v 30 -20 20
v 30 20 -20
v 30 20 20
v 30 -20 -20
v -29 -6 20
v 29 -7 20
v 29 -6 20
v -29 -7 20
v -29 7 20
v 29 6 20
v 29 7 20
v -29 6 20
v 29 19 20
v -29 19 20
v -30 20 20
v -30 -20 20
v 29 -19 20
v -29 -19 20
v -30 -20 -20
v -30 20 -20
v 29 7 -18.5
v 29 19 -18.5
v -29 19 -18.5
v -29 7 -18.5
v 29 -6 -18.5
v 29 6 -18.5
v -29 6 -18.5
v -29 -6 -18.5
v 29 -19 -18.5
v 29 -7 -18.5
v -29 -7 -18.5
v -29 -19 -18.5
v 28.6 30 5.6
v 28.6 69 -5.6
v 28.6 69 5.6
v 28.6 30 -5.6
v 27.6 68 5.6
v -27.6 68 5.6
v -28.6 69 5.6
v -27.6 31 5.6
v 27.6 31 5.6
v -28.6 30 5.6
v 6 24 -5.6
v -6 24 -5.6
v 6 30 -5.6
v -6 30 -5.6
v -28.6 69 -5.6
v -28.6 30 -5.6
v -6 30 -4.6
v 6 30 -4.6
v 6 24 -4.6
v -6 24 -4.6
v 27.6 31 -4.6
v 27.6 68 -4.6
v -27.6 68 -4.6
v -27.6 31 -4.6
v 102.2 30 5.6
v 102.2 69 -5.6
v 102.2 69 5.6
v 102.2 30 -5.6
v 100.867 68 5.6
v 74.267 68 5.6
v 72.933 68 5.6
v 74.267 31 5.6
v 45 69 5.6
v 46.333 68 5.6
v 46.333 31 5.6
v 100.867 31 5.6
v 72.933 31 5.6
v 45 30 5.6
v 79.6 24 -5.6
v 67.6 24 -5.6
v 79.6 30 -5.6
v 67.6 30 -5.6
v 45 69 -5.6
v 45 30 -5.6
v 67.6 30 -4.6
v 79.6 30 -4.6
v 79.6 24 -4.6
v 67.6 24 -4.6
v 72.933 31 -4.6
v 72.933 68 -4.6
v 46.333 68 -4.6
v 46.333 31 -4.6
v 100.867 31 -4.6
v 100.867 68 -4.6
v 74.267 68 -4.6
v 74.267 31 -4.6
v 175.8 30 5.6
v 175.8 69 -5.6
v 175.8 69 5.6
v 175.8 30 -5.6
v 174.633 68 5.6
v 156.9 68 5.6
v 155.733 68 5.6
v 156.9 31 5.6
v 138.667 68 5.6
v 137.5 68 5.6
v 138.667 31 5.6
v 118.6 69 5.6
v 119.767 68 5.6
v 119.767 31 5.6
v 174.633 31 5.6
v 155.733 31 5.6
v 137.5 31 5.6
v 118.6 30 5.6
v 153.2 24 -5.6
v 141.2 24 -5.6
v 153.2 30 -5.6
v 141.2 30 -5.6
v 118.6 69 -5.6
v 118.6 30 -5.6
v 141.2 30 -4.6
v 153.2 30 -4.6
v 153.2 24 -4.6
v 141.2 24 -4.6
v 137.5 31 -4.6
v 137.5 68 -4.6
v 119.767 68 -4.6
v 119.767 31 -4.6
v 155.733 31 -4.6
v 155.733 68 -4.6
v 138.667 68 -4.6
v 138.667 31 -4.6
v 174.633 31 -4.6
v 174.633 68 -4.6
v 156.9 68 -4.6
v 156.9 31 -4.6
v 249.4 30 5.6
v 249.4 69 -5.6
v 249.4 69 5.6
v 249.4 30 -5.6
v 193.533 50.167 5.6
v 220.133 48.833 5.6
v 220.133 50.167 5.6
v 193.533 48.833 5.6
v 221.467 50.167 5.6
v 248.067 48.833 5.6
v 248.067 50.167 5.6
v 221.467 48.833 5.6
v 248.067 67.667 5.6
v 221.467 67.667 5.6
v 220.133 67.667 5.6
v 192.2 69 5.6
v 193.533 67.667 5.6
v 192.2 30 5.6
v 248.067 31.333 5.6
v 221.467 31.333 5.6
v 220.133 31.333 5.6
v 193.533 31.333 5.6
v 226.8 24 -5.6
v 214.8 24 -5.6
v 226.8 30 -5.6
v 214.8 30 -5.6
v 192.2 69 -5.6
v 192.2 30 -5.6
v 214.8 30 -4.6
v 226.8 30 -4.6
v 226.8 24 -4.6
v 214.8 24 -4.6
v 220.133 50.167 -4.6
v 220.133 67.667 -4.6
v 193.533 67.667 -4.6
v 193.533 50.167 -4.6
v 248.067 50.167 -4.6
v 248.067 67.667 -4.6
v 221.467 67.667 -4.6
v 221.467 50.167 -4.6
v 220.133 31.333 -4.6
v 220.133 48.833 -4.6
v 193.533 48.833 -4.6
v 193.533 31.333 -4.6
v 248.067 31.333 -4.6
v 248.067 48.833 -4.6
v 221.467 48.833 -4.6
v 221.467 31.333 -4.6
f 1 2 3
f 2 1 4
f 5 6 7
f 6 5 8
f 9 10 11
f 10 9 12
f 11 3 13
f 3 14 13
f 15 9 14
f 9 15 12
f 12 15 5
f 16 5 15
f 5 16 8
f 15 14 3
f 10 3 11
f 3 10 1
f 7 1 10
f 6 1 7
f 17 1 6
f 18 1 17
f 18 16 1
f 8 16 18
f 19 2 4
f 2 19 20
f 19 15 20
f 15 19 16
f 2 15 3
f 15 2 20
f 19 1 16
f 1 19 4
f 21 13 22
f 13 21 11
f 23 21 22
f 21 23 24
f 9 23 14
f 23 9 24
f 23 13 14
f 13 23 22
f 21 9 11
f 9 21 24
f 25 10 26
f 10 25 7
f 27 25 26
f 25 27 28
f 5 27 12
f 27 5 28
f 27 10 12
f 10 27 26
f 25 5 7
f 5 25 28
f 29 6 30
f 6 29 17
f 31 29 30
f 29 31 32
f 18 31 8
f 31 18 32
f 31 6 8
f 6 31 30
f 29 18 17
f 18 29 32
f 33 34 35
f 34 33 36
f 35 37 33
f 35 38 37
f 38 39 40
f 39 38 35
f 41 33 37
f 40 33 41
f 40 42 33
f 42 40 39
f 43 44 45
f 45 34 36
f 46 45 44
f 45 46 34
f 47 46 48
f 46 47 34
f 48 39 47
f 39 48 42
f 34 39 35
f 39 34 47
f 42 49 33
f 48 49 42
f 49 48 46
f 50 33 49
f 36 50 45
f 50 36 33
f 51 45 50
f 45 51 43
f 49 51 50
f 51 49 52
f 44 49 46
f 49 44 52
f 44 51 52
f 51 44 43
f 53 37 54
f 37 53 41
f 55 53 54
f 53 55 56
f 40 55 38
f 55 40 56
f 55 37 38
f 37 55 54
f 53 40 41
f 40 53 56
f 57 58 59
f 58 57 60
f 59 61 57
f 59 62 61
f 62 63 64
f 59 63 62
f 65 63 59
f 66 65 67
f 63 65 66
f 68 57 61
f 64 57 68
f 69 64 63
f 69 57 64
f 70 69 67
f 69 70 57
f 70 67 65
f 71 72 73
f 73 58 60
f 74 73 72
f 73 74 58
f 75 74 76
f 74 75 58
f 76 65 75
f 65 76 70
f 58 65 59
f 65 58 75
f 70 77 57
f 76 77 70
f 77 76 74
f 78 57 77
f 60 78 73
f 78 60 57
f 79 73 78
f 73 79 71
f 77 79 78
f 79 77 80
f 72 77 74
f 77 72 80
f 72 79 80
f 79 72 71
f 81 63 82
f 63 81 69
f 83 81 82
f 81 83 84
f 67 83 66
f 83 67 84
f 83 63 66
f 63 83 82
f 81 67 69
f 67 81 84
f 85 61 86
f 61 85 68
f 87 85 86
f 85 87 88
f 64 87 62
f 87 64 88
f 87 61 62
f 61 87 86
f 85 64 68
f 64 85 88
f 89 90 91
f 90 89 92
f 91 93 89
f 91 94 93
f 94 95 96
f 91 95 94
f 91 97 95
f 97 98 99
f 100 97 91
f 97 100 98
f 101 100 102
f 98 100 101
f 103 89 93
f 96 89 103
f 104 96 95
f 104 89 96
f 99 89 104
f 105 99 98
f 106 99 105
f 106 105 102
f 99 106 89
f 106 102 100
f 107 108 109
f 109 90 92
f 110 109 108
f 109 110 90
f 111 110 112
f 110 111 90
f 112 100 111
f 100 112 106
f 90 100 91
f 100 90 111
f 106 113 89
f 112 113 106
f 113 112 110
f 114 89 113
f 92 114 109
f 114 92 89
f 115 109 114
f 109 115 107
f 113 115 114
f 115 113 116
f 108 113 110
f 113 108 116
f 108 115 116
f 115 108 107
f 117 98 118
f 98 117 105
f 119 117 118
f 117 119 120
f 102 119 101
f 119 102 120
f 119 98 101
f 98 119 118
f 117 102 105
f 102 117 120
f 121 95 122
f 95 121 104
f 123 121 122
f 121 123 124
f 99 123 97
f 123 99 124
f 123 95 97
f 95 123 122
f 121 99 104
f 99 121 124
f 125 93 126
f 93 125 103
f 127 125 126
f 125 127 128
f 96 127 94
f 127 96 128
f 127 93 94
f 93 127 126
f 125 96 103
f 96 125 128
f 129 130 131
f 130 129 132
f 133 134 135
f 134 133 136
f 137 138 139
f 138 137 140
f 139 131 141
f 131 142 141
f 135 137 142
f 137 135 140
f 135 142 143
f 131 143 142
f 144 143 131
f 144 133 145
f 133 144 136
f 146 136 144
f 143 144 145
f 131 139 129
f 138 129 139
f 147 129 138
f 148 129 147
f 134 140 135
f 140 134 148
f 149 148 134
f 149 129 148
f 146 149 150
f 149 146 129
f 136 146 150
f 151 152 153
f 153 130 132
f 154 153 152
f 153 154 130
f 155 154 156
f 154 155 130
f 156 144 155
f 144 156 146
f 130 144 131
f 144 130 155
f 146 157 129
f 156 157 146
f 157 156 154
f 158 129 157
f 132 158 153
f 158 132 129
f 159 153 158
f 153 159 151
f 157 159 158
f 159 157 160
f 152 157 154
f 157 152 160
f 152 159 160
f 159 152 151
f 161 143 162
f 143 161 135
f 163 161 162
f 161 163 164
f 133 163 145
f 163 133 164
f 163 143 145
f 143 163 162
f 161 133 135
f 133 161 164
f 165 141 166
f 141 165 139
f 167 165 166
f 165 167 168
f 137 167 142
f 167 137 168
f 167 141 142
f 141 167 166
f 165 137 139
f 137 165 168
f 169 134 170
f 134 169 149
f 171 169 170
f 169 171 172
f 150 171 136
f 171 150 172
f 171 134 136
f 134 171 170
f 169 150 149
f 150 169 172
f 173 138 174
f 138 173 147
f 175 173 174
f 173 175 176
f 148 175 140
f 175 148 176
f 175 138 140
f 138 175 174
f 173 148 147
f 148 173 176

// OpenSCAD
/* [ Parametric 3 drawer box v.1 ]
written by: Hermes Alvarado <hermesalvarado@gmail.com
*/

//Define main dimensions:
thickness =1;
bottomthickness = 1;
boxwidth = 60;
boxheight = 40;
boxdepth = 40;
tolerance = .4;
//Handle dimension:
handlewidth = 12;
handledepth = 6;
//Automatic definitions:
holeheight = (boxheight/3)-(thickness*1.3333);
drawerwidth = boxwidth-(thickness*2)-(tolerance*2);
drawerheight = holeheight-tolerance*2;
drawerdepth = boxdepth-bottomthickness;
drawerpositionY = boxheight*.75+drawerdepth/2;
drawerpositionX = boxwidth*.75+drawerwidth/2;

//Making box:
difference(){
    cube([boxwidth,boxheight,boxdepth], true);
    translate([0,holeheight+thickness,bottomthickness]){
            cube([(boxwidth-(thickness*2)),holeheight,(boxdepth-bottomthickness)],true);
    }
    translate([0,0,bottomthickness]){
            cube([(boxwidth-(thickness*2)),holeheight,(boxdepth-bottomthickness)],true);
    }
    translate([0,-(holeheight+thickness),bottomthickness]){
            cube([(boxwidth-(thickness*2)),holeheight,(boxdepth-bottomthickness)],true);
    }
}

//Making drawers:
//Simple drawer:
difference(){
    union(){
        translate([0,drawerpositionY,0]){
            cube([drawerwidth,drawerdepth,drawerheight],true);
        }
        translate([0,drawerpositionY-drawerdepth/2-handledepth/2,-drawerheight/2+bottomthickness/2]){
            cube([handlewidth,handledepth,bottomthickness],true);
        }
    }
    translate([0,drawerpositionY,bottomthickness]){
        cube([drawerwidth-thickness*2,drawerdepth-thickness*2,drawerheight],true);
    }
}
//2 holes drawer:
difference(){
    union(){
        translate([drawerpositionX,drawerpositionY,0]){
            cube([drawerwidth,drawerdepth,drawerheight],true);
        }
        translate([drawerpositionX,drawerpositionY-drawerdepth/2-handledepth/2,-drawerheight/2+bottomthickness/2]){
            cube([handlewidth,handledepth,bottomthickness],true);
        }
    }
    translate([drawerpositionX-drawerwidth/4+thickness/3,drawerpositionY,bottomthickness]){
        cube([drawerwidth/2-thickness*2,drawerdepth-thickness*2,drawerheight],true);
    }
    translate([drawerpositionX+drawerwidth/4-thickness/3,drawerpositionY,bottomthickness]){
        cube([drawerwidth/2-thickness*2,drawerdepth-thickness*2,drawerheight],true);
    }
}
//3 holes drawer:
difference(){
    union(){
        translate([drawerpositionX*2,drawerpositionY,0]){
            cube([drawerwidth,drawerdepth,drawerheight],true);
        }
        translate([drawerpositionX*2,drawerpositionY-drawerdepth/2-handledepth/2,-drawerheight/2+bottomthickness/2]){
            cube([handlewidth,handledepth,bottomthickness],true);
        }
    }
    translate([drawerpositionX*2-drawerwidth/3+thickness/2,drawerpositionY,bottomthickness]){
        cube([drawerwidth/3-thickness*1.3333,drawerdepth-thickness*2,drawerheight],true);
    }
    translate([drawerpositionX*2,drawerpositionY,bottomthickness]){
        cube([drawerwidth/3-thickness*2,drawerdepth-thickness*2,drawerheight],true);
    }
    translate([drawerpositionX*2+drawerwidth/3-thickness/2,drawerpositionY,bottomthickness]){
        cube([drawerwidth/3-thickness*1.3333,drawerdepth-thickness*2,drawerheight],true);
    }
}
//4 holes drawer:
difference(){
    union(){
        translate([drawerpositionX*3,drawerpositionY,0]){
            cube([drawerwidth,drawerdepth,drawerheight],true);
        }
        translate([drawerpositionX*3,drawerpositionY-drawerdepth/2-handledepth/2,-drawerheight/2+bottomthickness/2]){
            cube([handlewidth,handledepth,bottomthickness],true);
        }
    }
    translate([drawerpositionX*3-drawerwidth/4+thickness/3,drawerpositionY+drawerdepth/4-thickness/3,bottomthickness]){
        cube([drawerwidth/2-thickness*2,drawerdepth/2-thickness*2,drawerheight],true);
    }
    translate([drawerpositionX*3+drawerwidth/4-thickness/3,drawerpositionY+drawerdepth/4-thickness/3,bottomthickness]){
        cube([drawerwidth/2-thickness*2,drawerdepth/2-thickness*2,drawerheight],true);
    }
    translate([drawerpositionX*3-drawerwidth/4+thickness/3,drawerpositionY-drawerdepth/4+thickness/3,bottomthickness]){
        cube([drawerwidth/2-thickness*2,drawerdepth/2-thickness*2,drawerheight],true);
    }
    translate([drawerpositionX*3+drawerwidth/4-thickness/3,drawerpositionY-drawerdepth/4+thickness/3,bottomthickness]){
        cube([drawerwidth/2-thickness*2,drawerdepth/2-thickness*2,drawerheight],true);
    }
}
